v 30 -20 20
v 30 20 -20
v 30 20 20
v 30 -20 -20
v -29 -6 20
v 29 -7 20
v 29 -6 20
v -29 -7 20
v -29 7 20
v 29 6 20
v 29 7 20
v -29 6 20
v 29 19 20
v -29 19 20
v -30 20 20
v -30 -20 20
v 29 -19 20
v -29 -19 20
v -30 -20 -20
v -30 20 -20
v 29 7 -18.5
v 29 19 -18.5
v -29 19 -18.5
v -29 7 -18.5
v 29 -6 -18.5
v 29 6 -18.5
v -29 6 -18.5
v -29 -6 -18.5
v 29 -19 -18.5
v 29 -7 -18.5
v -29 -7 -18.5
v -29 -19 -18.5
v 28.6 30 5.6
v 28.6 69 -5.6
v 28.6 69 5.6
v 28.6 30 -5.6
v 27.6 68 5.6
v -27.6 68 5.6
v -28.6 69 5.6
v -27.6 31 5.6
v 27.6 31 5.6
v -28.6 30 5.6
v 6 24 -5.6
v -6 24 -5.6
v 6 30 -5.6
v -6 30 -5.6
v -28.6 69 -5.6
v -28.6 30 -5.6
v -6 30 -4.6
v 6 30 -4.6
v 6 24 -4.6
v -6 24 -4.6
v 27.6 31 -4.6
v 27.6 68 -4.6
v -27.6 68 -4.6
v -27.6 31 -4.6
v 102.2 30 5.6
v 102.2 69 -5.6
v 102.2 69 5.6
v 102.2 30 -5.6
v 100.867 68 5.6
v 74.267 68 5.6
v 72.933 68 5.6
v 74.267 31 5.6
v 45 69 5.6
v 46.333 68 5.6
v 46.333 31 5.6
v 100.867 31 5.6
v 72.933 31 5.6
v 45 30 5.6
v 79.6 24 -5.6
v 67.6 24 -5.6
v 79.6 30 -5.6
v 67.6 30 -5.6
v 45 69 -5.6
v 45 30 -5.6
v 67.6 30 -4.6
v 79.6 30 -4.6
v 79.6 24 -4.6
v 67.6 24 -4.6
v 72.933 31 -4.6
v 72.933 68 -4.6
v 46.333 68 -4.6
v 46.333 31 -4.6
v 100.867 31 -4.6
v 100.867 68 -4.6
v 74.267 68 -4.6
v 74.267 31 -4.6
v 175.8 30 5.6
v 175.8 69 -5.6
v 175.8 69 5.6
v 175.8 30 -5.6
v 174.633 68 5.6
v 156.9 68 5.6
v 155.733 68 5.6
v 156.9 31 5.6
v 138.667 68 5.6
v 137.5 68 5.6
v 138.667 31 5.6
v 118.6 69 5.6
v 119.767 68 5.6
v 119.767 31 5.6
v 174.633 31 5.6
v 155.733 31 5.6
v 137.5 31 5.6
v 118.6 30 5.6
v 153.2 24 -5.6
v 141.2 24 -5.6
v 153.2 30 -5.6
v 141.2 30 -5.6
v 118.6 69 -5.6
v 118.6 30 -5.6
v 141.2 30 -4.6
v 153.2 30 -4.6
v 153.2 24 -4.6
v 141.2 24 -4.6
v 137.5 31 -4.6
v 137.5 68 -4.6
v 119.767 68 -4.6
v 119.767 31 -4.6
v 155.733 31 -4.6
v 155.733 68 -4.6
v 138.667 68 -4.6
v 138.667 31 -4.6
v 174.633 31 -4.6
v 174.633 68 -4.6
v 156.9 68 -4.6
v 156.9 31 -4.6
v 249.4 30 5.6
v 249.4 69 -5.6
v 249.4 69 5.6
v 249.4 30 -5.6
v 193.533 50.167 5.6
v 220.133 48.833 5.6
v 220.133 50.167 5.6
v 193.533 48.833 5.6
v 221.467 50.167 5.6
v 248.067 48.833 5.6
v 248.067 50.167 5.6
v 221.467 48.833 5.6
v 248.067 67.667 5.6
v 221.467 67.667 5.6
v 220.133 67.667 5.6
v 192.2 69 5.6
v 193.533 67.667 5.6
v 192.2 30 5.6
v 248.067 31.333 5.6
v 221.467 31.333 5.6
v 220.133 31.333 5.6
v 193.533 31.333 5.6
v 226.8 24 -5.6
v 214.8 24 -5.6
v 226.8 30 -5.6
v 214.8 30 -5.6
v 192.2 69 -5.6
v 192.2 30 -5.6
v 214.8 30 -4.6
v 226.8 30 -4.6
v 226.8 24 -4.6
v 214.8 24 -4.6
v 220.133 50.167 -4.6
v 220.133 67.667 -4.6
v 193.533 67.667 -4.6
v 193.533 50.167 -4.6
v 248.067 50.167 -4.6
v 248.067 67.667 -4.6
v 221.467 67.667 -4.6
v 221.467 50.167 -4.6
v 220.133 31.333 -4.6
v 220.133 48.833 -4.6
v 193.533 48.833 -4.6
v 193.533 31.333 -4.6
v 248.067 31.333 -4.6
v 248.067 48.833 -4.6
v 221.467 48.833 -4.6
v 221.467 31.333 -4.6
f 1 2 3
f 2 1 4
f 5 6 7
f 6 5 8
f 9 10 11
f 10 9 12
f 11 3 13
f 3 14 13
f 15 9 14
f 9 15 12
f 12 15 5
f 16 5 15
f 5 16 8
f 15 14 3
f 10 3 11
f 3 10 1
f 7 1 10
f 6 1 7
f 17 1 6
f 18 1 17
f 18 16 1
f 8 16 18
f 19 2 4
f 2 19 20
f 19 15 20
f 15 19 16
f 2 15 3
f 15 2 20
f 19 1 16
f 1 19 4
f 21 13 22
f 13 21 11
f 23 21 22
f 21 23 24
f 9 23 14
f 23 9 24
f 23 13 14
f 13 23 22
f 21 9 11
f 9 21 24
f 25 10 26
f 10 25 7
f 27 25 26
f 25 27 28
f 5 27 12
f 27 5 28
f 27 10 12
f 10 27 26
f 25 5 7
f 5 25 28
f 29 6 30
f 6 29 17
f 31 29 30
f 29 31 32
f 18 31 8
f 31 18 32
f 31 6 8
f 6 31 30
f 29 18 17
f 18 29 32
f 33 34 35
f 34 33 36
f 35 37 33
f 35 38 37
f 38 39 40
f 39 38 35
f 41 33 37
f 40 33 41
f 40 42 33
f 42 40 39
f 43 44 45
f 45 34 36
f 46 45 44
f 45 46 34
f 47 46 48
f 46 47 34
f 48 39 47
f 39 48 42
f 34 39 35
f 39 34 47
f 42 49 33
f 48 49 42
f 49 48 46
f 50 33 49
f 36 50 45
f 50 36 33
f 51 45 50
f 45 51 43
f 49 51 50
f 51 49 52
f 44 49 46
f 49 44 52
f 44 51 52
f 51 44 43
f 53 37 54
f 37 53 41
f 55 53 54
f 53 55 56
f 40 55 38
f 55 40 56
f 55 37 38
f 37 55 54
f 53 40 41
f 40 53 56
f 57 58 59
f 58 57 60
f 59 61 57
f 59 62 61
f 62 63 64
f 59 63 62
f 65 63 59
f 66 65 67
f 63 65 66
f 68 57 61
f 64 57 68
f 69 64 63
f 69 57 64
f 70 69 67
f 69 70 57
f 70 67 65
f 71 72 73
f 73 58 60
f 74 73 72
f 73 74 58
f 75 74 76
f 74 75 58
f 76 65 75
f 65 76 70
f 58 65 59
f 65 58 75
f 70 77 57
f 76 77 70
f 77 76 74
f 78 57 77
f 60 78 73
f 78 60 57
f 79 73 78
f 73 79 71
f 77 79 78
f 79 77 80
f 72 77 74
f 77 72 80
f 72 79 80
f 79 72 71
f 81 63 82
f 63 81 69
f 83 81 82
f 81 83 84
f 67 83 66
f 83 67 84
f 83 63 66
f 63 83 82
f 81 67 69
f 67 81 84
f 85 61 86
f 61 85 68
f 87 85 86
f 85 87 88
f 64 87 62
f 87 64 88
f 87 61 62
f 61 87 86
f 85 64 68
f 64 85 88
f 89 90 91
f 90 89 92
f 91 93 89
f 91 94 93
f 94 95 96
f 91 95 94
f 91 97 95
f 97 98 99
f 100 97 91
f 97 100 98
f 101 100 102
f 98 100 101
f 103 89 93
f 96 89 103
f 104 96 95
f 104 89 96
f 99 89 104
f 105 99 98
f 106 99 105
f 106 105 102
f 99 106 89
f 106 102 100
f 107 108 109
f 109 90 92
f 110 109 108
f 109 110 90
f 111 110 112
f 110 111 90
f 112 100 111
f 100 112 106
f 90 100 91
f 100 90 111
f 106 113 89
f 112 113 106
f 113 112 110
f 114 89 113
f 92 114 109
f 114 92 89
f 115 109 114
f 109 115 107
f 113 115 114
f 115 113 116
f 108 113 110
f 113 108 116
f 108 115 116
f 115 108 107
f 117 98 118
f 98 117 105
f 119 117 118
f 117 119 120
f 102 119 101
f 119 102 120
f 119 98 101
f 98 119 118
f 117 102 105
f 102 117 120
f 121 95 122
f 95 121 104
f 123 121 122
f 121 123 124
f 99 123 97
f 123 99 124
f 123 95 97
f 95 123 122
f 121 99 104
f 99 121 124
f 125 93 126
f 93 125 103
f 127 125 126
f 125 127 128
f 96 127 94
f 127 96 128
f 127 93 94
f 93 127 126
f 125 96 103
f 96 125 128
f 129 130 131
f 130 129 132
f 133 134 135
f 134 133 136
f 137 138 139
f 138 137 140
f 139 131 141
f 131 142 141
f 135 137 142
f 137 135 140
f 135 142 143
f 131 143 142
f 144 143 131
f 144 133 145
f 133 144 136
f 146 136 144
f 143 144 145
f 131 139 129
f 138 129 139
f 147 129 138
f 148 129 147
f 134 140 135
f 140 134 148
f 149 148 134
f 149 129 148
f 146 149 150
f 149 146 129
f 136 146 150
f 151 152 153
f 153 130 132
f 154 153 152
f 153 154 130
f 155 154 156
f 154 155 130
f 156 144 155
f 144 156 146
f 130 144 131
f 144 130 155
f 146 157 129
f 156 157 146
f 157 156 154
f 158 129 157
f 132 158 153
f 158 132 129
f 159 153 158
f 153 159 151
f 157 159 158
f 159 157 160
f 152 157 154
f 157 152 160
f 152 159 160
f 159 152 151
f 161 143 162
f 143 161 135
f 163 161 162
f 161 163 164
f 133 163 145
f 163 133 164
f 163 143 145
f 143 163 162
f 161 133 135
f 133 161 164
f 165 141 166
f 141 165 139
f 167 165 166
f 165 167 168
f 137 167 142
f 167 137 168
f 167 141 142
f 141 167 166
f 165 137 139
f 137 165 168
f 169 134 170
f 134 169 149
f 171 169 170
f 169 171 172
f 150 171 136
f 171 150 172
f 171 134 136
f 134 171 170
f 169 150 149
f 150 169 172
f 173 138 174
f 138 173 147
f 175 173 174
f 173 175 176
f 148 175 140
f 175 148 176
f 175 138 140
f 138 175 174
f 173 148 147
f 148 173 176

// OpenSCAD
/* [ Parametric 3 drawer box v.1 ]
written by: Hermes Alvarado <hermesalvarado@gmail.com
*/

//Define main dimensions:
thickness =1;
bottomthickness = 1;
boxwidth = 60;
boxheight = 40;
boxdepth = 40;
tolerance = .4;
//Handle dimension:
handlewidth = 12;
handledepth = 6;
//Automatic definitions:
holeheight = (boxheight/3)-(thickness*1.3333);
drawerwidth = boxwidth-(thickness*2)-(tolerance*2);
drawerheight = holeheight-tolerance*2;
drawerdepth = boxdepth-bottomthickness;
drawerpositionY = boxheight*.75+drawerdepth/2;
drawerpositionX = boxwidth*.75+drawerwidth/2;

//Making box:
difference(){
    cube([boxwidth,boxheight,boxdepth], true);
    translate([0,holeheight+thickness,bottomthickness]){
            cube([(boxwidth-(thickness*2)),holeheight,(boxdepth-bottomthickness)],true);
    }
    translate([0,0,bottomthickness]){
            cube([(boxwidth-(thickness*2)),holeheight,(boxdepth-bottomthickness)],true);
    }
    translate([0,-(holeheight+thickness),bottomthickness]){
            cube([(boxwidth-(thickness*2)),holeheight,(boxdepth-bottomthickness)],true);
    }
}

//Making drawers:
//Simple drawer:
difference(){
    union(){
        translate([0,drawerpositionY,0]){
            cube([drawerwidth,drawerdepth,drawerheight],true);
        }
        translate([0,drawerpositionY-drawerdepth/2-handledepth/2,-drawerheight/2+bottomthickness/2]){
            cube([handlewidth,handledepth,bottomthickness],true);
        }
    }
    translate([0,drawerpositionY,bottomthickness]){
        cube([drawerwidth-thickness*2,drawerdepth-thickness*2,drawerheight],true);
    }
}
//2 holes drawer:
difference(){
    union(){
        translate([drawerpositionX,drawerpositionY,0]){
            cube([drawerwidth,drawerdepth,drawerheight],true);
        }
        translate([drawerpositionX,drawerpositionY-drawerdepth/2-handledepth/2,-drawerheight/2+bottomthickness/2]){
            cube([handlewidth,handledepth,bottomthickness],true);
        }
    }
    translate([drawerpositionX-drawerwidth/4+thickness/3,drawerpositionY,bottomthickness]){
        cube([drawerwidth/2-thickness*2,drawerdepth-thickness*2,drawerheight],true);
    }
    translate([drawerpositionX+drawerwidth/4-thickness/3,drawerpositionY,bottomthickness]){
        cube([drawerwidth/2-thickness*2,drawerdepth-thickness*2,drawerheight],true);
    }
}
//3 holes drawer:
difference(){
    union(){
        translate([drawerpositionX*2,drawerpositionY,0]){
            cube([drawerwidth,drawerdepth,drawerheight],true);
        }
        translate([drawerpositionX*2,drawerpositionY-drawerdepth/2-handledepth/2,-drawerheight/2+bottomthickness/2]){
            cube([handlewidth,handledepth,bottomthickness],true);
        }
    }
    translate([drawerpositionX*2-drawerwidth/3+thickness/2,drawerpositionY,bottomthickness]){
        cube([drawerwidth/3-thickness*1.3333,drawerdepth-thickness*2,drawerheight],true);
    }
    translate([drawerpositionX*2,drawerpositionY,bottomthickness]){
        cube([drawerwidth/3-thickness*2,drawerdepth-thickness*2,drawerheight],true);
    }
    translate([drawerpositionX*2+drawerwidth/3-thickness/2,drawerpositionY,bottomthickness]){
        cube([drawerwidth/3-thickness*1.3333,drawerdepth-thickness*2,drawerheight],true);
    }
}
//4 holes drawer:
difference(){
    union(){
        translate([drawerpositionX*3,drawerpositionY,0]){
            cube([drawerwidth,drawerdepth,drawerheight],true);
        }
        translate([drawerpositionX*3,drawerpositionY-drawerdepth/2-handledepth/2,-drawerheight/2+bottomthickness/2]){
            cube([handlewidth,handledepth,bottomthickness],true);
        }
    }
    translate([drawerpositionX*3-drawerwidth/4+thickness/3,drawerpositionY+drawerdepth/4-thickness/3,bottomthickness]){
        cube([drawerwidth/2-thickness*2,drawerdepth/2-thickness*2,drawerheight],true);
    }
    translate([drawerpositionX*3+drawerwidth/4-thickness/3,drawerpositionY+drawerdepth/4-thickness/3,bottomthickness]){
        cube([drawerwidth/2-thickness*2,drawerdepth/2-thickness*2,drawerheight],true);
    }
    translate([drawerpositionX*3-drawerwidth/4+thickness/3,drawerpositionY-drawerdepth/4+thickness/3,bottomthickness]){
        cube([drawerwidth/2-thickness*2,drawerdepth/2-thickness*2,drawerheight],true);
    }
    translate([drawerpositionX*3+drawerwidth/4-thickness/3,drawerpositionY-drawerdepth/4+thickness/3,bottomthickness]){
        cube([drawerwidth/2-thickness*2,drawerdepth/2-thickness*2,drawerheight],true);
    }
}
